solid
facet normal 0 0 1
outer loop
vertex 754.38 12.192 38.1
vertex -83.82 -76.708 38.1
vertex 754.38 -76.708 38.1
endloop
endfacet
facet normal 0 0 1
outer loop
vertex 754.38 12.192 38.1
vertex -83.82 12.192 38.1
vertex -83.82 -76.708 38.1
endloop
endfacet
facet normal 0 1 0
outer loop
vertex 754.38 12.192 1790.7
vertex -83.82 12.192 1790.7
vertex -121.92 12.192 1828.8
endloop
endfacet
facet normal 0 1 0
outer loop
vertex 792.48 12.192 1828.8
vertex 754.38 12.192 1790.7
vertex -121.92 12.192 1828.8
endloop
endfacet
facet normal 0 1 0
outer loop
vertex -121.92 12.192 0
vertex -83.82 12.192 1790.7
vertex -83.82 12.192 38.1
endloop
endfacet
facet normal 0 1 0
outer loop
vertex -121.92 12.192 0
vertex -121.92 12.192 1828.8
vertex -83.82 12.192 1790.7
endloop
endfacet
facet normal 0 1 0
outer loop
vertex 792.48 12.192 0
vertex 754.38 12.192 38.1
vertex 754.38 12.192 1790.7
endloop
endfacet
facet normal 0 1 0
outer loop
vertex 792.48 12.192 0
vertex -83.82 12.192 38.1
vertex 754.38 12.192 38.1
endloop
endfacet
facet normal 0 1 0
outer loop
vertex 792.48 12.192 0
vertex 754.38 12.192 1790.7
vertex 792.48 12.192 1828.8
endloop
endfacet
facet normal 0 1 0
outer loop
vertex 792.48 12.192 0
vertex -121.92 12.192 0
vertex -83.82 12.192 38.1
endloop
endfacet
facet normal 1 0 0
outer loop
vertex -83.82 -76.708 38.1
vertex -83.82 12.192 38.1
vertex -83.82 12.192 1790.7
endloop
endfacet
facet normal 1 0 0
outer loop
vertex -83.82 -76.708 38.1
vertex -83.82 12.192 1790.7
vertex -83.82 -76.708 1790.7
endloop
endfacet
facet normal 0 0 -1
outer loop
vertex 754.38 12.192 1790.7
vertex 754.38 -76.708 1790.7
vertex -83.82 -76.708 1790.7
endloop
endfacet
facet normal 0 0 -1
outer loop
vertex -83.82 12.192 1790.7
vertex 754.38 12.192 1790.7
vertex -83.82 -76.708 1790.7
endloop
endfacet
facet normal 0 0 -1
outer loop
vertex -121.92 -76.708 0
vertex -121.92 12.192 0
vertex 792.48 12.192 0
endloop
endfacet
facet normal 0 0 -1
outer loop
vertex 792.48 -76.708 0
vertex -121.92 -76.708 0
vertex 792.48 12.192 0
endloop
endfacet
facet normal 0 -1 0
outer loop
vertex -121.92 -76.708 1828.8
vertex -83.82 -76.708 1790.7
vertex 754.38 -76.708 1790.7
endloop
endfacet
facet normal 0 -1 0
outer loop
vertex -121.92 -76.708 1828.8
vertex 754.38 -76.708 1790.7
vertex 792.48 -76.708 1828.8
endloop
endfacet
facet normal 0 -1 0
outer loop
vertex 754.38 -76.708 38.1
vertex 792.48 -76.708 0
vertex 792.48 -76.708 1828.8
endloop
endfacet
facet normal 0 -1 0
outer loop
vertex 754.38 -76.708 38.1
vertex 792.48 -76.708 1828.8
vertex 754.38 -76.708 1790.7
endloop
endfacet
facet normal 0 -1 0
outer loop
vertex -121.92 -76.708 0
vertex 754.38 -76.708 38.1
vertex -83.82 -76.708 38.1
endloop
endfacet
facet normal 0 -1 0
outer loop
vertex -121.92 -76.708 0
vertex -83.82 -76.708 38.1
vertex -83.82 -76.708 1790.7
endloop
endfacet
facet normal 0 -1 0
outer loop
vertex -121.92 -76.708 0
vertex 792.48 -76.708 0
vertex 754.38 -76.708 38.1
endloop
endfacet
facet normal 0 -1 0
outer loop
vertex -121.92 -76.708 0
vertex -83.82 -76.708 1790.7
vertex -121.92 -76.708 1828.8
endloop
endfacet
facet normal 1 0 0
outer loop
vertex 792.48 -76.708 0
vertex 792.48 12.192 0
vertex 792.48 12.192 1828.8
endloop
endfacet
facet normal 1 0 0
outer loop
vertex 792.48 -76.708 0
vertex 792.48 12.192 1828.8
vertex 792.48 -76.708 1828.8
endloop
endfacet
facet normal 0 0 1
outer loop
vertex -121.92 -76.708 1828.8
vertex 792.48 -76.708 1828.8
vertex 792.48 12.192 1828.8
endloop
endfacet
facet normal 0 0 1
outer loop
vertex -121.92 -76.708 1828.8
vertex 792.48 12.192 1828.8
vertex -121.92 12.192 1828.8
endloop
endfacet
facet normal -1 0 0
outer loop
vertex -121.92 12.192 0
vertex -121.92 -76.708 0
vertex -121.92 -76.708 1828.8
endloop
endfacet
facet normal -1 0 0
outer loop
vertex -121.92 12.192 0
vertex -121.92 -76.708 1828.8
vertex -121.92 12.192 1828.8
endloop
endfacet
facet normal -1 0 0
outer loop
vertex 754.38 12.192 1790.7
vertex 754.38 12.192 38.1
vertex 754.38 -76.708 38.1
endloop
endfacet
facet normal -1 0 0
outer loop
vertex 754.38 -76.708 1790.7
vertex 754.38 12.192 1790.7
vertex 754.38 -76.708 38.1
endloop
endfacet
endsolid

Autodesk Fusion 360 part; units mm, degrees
sketch "Sketch1" plane through (0, 0, 0) normal (0, 0, 1) x (1, 0, 0)
  line L0 (-121.92, 12.192) -> (792.48, 12.192)
  line L1 (792.48, 12.192) -> (792.48, -76.708)
  line L2 (792.48, -76.708) -> (-121.92, -76.708)
  line L3 (-121.92, -76.708) -> (-121.92, 12.192)
  dimension "d1" = 914.4
  dimension "d6" = 88.9
extrude "Extrude1" add sketch "Sketch1" along normal blind 38.1
sketch "Sketch2" plane through (0, 0, 38.1) normal (0, 0, 1) x (-1, 0, 0)
  line L0 (121.92, 76.708) -> (-792.48, 76.708)
  line L1 (-792.48, 76.708) -> (-792.48, -12.192)
  line L2 (-792.48, -12.192) -> (121.92, -12.192)
  line L3 (121.92, -12.192) -> (121.92, 76.708)
  line L4 (121.92, -12.192) -> (83.82, -12.192)
  line L5 (83.82, -12.192) -> (83.82, 76.708)
  line L6 (83.82, 76.708) -> (121.92, 76.708)
  line L7 (121.92, 76.708) -> (121.92, -12.192)
  line L8 (-792.48, -12.192) -> (-754.38, -12.192)
  line L9 (-754.38, -12.192) -> (-754.38, 76.708)
  line L10 (-754.38, 76.708) -> (-792.48, 76.708)
  line L11 (-792.48, 76.708) -> (-792.48, -12.192)
  dimension "d9" = 38.1
  dimension "d10" = 38.1
extrude "Extrude2" add sketch "Sketch2" along normal blind 1752.6 contours L0 L2 L3 L4 L5 L6 L7 | L0 L1 L2 L8 L9 L10 L11
sketch "Sketch3" plane through (0, 0, 1790.7) normal (0, 0, 1) x (-1, 0, 0)
  line L0 (121.92, 76.708) -> (83.82, 76.708)
  line L1 (83.82, 76.708) -> (83.82, -12.192)
  line L2 (83.82, -12.192) -> (121.92, -12.192)
  line L3 (121.92, -12.192) -> (121.92, 76.708)
  line L4 (121.92, 76.708) -> (-792.48, 76.708)
  line L5 (-792.48, 76.708) -> (-792.48, -12.192)
  line L6 (-792.48, -12.192) -> (121.92, -12.192)
  line L7 (121.92, -12.192) -> (121.92, 76.708)
  dimension "d13" = 88.9
  dimension "d14" = 914.4
extrude "Extrude3" add sketch "Sketch3" along normal blind 38.1
sketch "Sketch4" plane through (0, -76.708, 0) normal (0, -1, 0) x (1, 0, 0)
  line L0 (754.38, 1790.7) -> (754.38, 38.1)
  line L1 (754.38, 38.1) -> (-83.82, 38.1)
  line L2 (-83.82, 38.1) -> (-83.82, 1790.7)
  line L3 (-83.82, 1790.7) -> (754.38, 1790.7)
  line L4 (792.48, 0) -> (792.48, 1828.8)
  line L5 (792.48, 1828.8) -> (-121.92, 1828.8)
  line L6 (-121.92, 1828.8) -> (-121.92, 0)
  line L7 (-121.92, 0) -> (792.48, 0)
  line L8 (-121.92, 1828.8) -> (792.48, 1828.8)
  line L9 (792.48, 1828.8) -> (792.48, 0)
  line L10 (792.48, 0) -> (-121.92, 0)
  line L11 (-121.92, 0) -> (-121.92, 1828.8)
  dimension "d17" = 914.4
  dimension "d18" = 1828.8
equation "d1 = BottomLength / 2"
equation "BottomLength = 6 ft"
equation "TopLength = 6 ft"
equation "RightLength = 6 ft"
equation "LeftLength = 6 ft"
equation "d11 = RightLength - ( ( ( 2 * 1.5 ) / 12 ) * 1 ft )"
equation "d14 = TopLength / 2"
